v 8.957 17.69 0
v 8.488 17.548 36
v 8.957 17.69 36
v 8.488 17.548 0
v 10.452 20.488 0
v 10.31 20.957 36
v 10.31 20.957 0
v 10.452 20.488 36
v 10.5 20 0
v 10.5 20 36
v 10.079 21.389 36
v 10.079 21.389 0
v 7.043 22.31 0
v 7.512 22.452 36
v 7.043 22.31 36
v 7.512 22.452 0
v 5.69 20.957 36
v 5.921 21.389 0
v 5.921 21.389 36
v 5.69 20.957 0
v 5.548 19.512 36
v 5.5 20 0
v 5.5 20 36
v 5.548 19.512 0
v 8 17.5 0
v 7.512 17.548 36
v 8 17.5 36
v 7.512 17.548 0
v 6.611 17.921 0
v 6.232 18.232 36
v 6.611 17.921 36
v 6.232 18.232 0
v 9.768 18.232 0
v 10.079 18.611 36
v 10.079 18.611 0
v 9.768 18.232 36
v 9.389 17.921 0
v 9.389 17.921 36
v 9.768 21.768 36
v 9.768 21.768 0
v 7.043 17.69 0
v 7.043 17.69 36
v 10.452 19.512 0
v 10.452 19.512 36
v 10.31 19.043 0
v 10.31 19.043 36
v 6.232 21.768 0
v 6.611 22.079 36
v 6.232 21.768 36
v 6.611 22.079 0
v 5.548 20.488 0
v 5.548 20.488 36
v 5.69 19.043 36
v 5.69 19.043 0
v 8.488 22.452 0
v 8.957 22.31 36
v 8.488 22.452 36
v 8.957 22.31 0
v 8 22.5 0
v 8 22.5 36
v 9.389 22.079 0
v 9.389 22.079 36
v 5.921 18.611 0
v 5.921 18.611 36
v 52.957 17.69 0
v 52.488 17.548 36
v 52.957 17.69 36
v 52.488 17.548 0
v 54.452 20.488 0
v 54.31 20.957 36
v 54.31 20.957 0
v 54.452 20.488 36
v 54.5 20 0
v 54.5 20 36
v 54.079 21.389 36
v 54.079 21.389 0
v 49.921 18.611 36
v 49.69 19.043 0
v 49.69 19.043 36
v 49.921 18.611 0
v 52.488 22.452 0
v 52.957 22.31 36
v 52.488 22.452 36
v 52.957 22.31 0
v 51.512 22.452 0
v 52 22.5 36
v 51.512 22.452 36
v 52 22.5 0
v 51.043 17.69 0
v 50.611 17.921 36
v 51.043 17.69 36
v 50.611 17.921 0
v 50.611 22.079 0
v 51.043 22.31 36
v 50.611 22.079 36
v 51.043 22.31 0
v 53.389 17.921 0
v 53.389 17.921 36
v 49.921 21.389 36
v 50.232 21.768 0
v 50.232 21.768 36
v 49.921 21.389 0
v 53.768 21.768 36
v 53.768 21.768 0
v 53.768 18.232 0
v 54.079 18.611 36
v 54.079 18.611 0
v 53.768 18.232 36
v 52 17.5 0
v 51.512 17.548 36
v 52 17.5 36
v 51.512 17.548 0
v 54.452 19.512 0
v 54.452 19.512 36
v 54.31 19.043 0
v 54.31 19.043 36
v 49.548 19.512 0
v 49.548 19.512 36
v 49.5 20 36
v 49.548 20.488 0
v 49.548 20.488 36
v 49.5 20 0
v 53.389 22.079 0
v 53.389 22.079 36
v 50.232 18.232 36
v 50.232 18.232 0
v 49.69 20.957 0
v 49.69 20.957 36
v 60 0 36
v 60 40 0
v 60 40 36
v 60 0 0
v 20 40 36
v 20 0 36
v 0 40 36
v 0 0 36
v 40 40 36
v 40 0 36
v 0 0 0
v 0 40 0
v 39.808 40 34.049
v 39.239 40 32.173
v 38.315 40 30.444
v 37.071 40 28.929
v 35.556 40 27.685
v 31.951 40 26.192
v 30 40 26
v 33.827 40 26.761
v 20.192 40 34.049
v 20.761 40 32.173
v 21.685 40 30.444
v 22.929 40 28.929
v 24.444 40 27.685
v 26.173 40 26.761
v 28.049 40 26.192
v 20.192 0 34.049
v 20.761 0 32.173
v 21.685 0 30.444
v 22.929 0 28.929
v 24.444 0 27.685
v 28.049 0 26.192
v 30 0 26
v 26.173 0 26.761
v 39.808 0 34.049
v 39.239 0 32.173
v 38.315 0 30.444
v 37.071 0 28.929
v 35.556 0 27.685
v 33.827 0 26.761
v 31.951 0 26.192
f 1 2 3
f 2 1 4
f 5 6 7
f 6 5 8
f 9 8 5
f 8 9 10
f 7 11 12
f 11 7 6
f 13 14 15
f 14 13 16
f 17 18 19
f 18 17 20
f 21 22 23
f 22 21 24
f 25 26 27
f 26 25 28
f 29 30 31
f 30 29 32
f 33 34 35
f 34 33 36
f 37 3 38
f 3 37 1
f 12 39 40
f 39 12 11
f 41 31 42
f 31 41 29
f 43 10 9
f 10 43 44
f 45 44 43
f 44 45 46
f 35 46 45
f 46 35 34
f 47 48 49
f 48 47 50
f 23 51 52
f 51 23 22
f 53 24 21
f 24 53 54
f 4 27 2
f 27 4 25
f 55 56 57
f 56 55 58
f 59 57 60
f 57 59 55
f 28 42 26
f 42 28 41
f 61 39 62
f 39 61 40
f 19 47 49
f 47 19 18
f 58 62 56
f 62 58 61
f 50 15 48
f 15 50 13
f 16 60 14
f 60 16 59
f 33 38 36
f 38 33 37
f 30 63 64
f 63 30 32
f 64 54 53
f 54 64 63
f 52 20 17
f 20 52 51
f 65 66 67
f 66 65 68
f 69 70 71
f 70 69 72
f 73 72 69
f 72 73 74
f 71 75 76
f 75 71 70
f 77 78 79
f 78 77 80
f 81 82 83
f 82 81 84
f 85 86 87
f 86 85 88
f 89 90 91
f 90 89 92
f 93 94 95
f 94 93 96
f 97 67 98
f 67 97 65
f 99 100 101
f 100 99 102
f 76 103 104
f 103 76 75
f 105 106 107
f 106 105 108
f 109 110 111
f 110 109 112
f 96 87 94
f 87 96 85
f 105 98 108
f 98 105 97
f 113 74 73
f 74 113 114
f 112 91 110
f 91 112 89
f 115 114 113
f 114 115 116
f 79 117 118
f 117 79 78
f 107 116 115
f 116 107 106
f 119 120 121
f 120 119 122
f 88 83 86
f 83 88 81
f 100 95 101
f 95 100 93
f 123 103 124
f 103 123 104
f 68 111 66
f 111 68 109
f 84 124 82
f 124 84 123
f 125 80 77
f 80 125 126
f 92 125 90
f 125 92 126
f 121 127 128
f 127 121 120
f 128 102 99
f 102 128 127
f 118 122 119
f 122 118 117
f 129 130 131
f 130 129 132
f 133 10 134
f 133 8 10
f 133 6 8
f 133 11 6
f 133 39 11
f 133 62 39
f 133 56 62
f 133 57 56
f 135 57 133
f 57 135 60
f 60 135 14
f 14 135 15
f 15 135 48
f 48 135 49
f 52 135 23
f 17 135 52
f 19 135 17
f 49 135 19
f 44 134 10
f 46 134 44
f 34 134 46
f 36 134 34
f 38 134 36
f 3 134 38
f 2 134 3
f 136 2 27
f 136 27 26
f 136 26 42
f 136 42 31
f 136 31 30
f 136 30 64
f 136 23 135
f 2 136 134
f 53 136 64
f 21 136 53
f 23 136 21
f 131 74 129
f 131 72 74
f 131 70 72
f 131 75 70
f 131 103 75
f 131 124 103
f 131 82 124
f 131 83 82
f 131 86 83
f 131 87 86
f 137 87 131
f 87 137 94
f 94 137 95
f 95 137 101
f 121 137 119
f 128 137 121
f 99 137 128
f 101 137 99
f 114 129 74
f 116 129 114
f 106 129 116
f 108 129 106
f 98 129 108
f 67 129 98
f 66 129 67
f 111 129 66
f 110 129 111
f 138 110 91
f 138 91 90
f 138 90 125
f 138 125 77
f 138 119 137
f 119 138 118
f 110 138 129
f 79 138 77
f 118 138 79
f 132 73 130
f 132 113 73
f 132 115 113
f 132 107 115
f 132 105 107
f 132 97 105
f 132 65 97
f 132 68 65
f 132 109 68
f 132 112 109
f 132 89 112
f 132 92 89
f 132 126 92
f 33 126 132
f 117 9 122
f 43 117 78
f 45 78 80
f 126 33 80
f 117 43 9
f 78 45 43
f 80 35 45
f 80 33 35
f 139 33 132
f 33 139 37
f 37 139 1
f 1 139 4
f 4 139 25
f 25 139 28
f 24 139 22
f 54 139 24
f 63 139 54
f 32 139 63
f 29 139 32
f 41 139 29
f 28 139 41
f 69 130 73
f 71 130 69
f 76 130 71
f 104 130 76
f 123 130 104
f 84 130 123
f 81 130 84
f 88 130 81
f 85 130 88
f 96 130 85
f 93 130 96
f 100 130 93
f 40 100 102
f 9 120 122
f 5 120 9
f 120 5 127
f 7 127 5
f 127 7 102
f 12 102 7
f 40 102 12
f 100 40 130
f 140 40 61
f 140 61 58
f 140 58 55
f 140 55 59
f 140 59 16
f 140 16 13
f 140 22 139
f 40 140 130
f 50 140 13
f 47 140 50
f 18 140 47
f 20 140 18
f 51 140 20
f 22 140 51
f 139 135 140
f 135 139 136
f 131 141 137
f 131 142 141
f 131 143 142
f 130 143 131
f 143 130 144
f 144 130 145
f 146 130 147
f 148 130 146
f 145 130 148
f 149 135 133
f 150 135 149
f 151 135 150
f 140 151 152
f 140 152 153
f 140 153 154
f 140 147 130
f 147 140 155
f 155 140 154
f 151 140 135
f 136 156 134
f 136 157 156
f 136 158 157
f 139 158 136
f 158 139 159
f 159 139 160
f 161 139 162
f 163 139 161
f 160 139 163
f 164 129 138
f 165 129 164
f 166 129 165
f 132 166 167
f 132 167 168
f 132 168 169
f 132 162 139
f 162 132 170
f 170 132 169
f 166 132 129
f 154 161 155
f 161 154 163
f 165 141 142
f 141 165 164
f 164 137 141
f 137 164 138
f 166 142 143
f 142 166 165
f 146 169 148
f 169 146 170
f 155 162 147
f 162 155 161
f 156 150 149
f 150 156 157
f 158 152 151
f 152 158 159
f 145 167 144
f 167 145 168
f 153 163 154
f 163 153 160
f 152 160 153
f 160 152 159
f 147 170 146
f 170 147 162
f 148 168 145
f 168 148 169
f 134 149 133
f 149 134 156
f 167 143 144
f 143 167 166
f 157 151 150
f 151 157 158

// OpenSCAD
$fn = 32;

// ----------------------------------------------------------------------
// Saddle clamp: plain shaft clamp
// ----------------------------------------------------------------------

// --- parameters (mm) ---
blk_l = 60;               // block length, X
blk_w = 40;               // block width, Y
blk_h = 36;               // block height
clamp_r = 10;             // shaft groove radius
hole_r = 2.5;             // bolt hole radius
hole_m = 8;               // bolt hole margin from the ends

saw_depth = clamp_r + 3;  // saw kerf depth

difference() {
  cube([blk_l, blk_w, blk_h]);
  translate([blk_l / 2, -1, blk_h])
    rotate([-90, 0, 0])
      cylinder(h = blk_w + 2, r = clamp_r);
  for (sx = [0, 1])
    translate([sx ? blk_l - hole_m : hole_m, blk_w / 2, -1])
      cylinder(r = hole_r, h = blk_h + 2);
}
